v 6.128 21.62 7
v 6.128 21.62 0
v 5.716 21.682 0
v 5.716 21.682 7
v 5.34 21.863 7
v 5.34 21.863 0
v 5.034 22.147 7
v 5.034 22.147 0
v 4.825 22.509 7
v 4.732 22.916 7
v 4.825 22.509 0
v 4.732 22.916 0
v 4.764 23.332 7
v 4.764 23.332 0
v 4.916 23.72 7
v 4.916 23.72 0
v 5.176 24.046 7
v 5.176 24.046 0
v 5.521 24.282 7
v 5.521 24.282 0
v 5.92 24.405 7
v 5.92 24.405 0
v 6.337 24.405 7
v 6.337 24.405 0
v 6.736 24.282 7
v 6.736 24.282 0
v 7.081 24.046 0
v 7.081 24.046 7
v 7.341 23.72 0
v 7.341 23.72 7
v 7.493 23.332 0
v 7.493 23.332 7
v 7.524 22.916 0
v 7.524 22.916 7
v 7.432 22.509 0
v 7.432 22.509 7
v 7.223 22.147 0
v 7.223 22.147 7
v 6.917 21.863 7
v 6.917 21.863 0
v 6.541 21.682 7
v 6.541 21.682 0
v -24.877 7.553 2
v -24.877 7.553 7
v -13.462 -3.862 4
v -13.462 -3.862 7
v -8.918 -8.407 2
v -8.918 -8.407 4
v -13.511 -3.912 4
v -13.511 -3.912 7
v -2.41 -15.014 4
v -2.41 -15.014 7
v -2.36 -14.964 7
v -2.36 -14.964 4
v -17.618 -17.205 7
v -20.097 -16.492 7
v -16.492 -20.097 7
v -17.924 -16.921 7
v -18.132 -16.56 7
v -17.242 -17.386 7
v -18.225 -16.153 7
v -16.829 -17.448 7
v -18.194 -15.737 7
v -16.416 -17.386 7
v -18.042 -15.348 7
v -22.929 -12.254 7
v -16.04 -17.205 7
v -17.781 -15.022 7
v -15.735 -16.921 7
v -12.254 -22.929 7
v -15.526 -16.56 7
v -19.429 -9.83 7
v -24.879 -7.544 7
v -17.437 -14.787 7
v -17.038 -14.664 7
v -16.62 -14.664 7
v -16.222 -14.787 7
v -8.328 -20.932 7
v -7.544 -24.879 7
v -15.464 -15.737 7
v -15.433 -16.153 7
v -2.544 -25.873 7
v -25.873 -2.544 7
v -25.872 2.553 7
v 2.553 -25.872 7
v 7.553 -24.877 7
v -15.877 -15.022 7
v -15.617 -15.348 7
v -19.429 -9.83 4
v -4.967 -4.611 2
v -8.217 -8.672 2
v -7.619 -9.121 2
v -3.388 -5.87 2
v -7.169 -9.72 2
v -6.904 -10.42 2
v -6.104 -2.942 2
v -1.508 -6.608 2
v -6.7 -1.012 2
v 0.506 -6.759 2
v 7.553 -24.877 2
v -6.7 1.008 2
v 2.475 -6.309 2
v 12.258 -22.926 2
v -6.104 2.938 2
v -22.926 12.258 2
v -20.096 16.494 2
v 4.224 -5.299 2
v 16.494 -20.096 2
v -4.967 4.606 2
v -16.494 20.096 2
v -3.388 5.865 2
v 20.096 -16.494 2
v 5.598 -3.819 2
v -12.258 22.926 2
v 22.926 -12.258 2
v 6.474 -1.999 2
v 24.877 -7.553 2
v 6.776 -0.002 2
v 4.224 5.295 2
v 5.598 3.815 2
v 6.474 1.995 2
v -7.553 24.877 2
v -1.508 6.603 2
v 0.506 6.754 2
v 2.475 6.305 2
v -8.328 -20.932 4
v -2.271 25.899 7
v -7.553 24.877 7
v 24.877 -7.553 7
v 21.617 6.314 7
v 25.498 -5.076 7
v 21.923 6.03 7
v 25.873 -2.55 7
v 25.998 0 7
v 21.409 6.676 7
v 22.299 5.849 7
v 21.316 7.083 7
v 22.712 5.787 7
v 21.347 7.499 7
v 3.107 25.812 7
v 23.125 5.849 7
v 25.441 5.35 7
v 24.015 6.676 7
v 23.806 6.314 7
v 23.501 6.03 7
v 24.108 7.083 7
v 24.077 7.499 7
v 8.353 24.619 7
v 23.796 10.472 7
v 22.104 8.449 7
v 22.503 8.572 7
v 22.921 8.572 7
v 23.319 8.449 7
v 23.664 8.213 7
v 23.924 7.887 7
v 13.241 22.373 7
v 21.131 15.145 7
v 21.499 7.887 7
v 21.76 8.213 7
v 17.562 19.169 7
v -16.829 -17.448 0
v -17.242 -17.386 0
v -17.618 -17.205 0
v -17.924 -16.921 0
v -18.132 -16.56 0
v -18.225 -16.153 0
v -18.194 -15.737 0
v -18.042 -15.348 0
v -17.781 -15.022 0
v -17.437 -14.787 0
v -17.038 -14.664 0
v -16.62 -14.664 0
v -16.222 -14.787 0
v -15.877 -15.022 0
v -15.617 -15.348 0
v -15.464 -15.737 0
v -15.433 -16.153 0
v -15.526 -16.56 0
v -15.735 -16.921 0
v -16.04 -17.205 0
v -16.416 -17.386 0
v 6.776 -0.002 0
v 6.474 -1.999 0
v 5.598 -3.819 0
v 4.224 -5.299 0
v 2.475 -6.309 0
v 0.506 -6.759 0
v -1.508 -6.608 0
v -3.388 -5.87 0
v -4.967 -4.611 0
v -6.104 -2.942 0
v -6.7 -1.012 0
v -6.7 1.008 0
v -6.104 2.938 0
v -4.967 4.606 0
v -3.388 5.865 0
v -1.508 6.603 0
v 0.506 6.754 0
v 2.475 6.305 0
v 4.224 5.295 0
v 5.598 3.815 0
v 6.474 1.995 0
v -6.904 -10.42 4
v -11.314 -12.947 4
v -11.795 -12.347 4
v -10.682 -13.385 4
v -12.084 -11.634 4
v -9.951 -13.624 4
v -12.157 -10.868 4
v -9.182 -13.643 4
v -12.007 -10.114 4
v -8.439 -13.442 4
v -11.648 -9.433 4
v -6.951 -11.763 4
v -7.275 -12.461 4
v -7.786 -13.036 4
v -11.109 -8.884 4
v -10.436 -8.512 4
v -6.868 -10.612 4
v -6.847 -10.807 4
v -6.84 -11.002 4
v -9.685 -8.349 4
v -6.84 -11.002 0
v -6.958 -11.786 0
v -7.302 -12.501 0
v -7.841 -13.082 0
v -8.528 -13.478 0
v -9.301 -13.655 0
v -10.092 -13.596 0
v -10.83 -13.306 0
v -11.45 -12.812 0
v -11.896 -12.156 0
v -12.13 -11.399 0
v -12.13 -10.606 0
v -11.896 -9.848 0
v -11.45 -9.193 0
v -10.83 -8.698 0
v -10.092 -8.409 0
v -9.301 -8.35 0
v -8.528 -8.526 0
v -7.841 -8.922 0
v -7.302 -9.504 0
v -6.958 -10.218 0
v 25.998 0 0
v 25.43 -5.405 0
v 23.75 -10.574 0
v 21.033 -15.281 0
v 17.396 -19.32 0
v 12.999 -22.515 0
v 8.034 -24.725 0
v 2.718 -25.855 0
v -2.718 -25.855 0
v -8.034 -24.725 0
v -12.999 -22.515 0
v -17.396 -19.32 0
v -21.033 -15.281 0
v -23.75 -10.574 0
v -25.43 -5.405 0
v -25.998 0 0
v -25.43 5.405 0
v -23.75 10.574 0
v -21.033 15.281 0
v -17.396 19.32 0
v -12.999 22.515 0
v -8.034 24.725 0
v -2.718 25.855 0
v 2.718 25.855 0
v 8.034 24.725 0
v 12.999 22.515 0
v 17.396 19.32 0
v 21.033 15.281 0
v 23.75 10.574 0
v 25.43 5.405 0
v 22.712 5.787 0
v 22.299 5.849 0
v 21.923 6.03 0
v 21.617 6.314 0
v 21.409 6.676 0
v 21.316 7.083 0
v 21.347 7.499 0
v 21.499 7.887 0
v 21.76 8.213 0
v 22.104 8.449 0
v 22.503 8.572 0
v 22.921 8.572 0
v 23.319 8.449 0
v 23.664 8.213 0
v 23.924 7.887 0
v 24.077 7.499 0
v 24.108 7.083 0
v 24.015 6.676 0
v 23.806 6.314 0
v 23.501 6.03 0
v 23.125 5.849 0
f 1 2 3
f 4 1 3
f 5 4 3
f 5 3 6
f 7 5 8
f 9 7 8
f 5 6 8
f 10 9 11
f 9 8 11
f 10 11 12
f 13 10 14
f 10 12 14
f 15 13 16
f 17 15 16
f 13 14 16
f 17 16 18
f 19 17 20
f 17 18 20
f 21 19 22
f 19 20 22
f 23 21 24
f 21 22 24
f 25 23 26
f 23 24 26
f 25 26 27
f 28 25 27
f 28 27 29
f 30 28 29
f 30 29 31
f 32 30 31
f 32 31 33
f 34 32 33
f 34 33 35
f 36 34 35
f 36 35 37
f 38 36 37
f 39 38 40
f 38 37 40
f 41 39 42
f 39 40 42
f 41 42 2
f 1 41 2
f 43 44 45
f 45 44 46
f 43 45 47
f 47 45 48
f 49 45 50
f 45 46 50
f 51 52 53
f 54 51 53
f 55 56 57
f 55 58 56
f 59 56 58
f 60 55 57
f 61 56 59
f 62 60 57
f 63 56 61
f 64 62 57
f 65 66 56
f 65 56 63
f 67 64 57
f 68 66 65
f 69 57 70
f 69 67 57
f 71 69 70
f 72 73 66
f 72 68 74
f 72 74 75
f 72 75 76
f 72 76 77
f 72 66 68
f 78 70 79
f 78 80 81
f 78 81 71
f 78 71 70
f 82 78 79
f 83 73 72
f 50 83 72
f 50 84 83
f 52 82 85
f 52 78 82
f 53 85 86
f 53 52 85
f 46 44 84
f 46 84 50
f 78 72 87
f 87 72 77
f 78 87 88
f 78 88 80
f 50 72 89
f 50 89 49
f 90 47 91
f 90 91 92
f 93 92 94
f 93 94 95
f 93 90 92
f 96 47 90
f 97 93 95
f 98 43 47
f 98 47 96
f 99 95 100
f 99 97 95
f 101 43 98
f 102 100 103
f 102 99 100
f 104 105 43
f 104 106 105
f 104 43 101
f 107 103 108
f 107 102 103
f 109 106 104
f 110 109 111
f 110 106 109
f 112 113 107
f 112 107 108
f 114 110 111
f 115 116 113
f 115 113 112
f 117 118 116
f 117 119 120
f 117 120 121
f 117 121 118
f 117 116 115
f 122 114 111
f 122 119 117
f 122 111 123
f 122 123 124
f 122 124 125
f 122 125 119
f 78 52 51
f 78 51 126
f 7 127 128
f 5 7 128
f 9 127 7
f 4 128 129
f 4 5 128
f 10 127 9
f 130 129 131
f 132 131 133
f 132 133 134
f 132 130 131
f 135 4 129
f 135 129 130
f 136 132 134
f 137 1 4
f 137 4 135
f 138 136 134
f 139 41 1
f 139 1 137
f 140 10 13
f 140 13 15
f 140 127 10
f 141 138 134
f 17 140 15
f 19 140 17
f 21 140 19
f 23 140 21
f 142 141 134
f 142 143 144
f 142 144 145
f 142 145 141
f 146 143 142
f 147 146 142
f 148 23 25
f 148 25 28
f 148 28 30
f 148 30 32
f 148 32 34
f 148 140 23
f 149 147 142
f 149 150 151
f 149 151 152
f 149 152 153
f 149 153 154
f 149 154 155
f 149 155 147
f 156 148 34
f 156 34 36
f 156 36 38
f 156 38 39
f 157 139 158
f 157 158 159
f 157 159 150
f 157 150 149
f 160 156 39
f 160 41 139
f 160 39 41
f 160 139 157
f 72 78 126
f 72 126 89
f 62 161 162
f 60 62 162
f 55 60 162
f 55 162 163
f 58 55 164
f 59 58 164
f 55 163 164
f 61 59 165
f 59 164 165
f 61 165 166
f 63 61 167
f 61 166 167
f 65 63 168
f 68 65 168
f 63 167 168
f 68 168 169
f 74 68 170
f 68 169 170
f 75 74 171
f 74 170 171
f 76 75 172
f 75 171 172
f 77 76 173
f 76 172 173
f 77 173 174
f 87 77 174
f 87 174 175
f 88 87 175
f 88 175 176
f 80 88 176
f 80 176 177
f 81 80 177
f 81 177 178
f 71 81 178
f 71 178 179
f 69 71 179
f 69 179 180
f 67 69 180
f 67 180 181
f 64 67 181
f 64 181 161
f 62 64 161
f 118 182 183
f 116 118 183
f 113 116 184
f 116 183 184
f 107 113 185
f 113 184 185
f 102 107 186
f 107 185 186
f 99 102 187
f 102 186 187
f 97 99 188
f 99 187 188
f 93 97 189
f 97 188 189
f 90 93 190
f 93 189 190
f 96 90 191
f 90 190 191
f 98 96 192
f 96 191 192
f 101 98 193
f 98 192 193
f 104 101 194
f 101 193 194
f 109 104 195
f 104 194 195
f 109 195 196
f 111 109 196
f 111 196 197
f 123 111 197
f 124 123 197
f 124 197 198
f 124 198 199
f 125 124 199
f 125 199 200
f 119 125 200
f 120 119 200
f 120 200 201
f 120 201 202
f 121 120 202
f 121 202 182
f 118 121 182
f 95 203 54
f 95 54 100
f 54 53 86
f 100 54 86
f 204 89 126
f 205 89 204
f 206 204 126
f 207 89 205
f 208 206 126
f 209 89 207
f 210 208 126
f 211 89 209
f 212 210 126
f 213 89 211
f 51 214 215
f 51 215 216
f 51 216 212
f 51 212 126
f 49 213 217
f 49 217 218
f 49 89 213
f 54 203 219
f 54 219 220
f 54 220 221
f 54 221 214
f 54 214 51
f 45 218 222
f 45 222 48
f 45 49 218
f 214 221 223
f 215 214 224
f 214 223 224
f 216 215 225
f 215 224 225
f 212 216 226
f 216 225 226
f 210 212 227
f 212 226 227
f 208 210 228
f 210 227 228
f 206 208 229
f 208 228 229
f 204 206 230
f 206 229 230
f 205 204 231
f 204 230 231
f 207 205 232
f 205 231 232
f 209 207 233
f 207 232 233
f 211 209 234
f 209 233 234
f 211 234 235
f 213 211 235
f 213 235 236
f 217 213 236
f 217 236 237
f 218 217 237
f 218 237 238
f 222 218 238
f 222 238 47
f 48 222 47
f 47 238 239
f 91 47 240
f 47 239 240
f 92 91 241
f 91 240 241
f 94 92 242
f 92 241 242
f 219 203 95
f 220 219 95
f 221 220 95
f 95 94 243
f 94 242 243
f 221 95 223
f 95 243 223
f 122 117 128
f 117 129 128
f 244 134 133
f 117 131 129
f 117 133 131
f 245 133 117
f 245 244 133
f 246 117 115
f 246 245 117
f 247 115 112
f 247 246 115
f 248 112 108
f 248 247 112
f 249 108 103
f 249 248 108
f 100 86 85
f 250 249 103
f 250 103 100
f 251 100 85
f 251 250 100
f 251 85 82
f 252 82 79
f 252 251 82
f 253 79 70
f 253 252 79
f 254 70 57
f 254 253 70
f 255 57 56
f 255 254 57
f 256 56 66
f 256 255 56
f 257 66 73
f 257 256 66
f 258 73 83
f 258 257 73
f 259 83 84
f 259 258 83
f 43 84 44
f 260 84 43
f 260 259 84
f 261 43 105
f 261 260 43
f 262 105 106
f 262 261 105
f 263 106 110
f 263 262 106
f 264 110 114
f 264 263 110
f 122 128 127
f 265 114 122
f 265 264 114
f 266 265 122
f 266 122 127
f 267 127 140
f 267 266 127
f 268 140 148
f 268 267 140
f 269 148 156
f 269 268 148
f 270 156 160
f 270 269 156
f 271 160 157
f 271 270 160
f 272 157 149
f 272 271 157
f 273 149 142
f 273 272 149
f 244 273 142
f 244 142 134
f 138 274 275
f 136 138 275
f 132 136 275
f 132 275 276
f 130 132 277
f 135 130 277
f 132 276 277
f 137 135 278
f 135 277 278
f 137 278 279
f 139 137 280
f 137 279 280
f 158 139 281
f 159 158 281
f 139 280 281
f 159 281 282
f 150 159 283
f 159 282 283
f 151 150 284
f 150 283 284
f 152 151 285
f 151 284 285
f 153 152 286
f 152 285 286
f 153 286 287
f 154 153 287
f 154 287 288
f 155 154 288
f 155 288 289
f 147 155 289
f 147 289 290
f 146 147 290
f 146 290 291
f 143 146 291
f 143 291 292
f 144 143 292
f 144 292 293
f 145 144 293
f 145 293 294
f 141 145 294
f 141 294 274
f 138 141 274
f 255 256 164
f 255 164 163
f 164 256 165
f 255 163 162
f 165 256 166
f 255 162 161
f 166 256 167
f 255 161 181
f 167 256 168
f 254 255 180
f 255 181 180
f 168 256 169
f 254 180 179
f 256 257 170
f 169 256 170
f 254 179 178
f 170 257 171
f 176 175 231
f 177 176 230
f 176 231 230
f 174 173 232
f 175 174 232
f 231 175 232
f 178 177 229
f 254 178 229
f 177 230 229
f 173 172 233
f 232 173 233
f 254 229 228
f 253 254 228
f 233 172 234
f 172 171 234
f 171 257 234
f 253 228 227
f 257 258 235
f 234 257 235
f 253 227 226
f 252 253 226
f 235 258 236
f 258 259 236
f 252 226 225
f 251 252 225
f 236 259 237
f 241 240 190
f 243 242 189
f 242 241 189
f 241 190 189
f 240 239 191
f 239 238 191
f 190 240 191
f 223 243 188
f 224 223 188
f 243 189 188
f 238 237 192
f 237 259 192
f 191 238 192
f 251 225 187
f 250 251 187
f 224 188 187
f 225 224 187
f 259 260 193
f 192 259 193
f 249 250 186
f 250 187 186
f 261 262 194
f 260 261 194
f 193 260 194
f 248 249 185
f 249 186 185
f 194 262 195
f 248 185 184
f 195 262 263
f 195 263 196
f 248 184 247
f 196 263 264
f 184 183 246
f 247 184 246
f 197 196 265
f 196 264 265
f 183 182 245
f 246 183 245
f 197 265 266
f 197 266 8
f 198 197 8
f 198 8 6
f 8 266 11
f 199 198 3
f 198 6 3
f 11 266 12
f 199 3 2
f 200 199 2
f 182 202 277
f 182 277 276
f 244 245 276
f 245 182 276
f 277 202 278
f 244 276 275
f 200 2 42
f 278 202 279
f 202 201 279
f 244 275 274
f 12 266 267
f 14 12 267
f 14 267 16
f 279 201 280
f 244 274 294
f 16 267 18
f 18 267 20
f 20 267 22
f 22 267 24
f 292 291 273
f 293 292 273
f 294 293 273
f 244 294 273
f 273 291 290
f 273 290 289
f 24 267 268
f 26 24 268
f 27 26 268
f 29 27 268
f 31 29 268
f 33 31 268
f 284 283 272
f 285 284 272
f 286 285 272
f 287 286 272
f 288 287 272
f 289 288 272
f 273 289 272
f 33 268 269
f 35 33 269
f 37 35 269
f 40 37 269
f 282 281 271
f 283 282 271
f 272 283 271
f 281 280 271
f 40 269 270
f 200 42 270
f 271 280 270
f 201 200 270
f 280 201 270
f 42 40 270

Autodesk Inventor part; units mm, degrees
ref_plane "YZ Plane" through (0, 0, 0) normal (1, 0, 0) x (0, 1, 0)
ref_plane "XZ Plane" through (0, 0, 0) normal (0, 1, 0) x (-1, 0, 0)
ref_plane "XY Plane" through (0, 0, 0) normal (0, 0, 1) x (1, 0, 0)
ref_plane "Work Plane1" through (0, 0, 0) normal (0, 0, 1) x (1, 0, 0)
sketch "Sketch1" plane through (0, 0, 0) normal (0, 0, 1) x (1, 0, 0)
  circle A0 centre (0, 0) radius 25.9979 projected
  circle A1 centre (-9.4998, -11.0022) radius 2.6601 projected
  circle A2 centre (0.0001, -0.0022) radius 3.8801 projected
  circle A3 centre (0.0001, -0.0022) radius 6.7754 projected
  point P0 (0, 0)
extrude "Extrusion1" add sketch "Sketch1" along normal blind 7 contours A0
sketch "Sketch2" plane through (0, 0, 7) normal (0, 0, 1) x (1, 0, 0)
  line L0 (32.4435, -15.1193) -> (-15.1193, 32.4435)
  line L1 (-15.1193, 32.4435) -> (-32.4435, 15.1193)
  line L2 (-32.4435, 15.1193) -> (15.1193, -32.4435)
  line L3 (15.1193, -32.4435) -> (32.4435, -15.1193)
  line L4 (32.4435, -15.1193) -> (-32.4435, 15.1193) construction
  line L5 (-15.1193, 32.4435) -> (15.1193, -32.4435) construction
  line L6 (32.4435, -15.1193) -> (99.7074, -15.1193) construction
  point P0 (0, 0)
  dimension "d2" = 135
  dimension "d3" = 24.5
extrude "Extrusion2" cut sketch "Sketch2" against normal blind 5
sketch "Sketch3" plane through (0, 0, 7) normal (0, 0, 1) x (1, 0, 0)
  line L0 (-8.3276, -20.7901) -> (-2.5509, -15.0135) projected
  line L1 (-2.5509, -15.0135) -> (-13.5111, -4.0533) projected
  line L2 (-19.2877, -9.8299) -> (-13.5111, -4.0533) projected
  line L3 (-8.3276, -20.7901) -> (-19.2877, -9.8299) projected
  line L4 (-13.5111, -3.9119) -> (-2.4095, -15.0135)
  line L5 (-2.4095, -15.0135) -> (-8.3276, -20.9315)
  line L6 (-8.3276, -20.9315) -> (-19.4292, -9.8299)
  line L7 (-19.4292, -9.8299) -> (-13.5111, -3.9119)
  line L8 (-8.9176, -8.4066) -> (-24.8767, 7.5526) projected
  line L9 (-13.4617, -3.8624) -> (-2.4095, -15.0135)
  line L10 (-2.4095, -15.0135) -> (-0.3384, -12.9607)
  line L11 (-0.3384, -12.9607) -> (-11.3905, -1.8096)
  line L12 (-11.3905, -1.8096) -> (-13.4617, -3.8624)
  line L13 (-13.4617, -3.8624) -> (-13.5111, -3.9119)
  line L14 (-8.9176, -8.4066) -> (-24.8767, 7.5526) projected
  point P0 (0, 0)
  dimension "d6" = 0.1
extrude "Extrusion3" cut sketch "Sketch3" against normal blind 3 contours L3 L2 L1 L0 | L13 L9 L4 | L4 L5 L6 L7 | L9 L12 L11 L10
sketch "Skizze4" plane through (0, 0, 7) normal (0, 0, 1) x (1, 0, 0)
  spline S0 degree 2 poles (24.1427, 2.2394) (24.731, 1.8489) (25.3785, 0.5587) (25.3785, -0.3311) knots 0 0 0 1 2 2 2 construction
  spline S1 degree 2 poles (25.3785, -0.3311) (25.3785, -1.1665) (24.7013, -2.5111) (24.1328, -2.8867) knots 0 0 0 1 2 2 2 construction
  spline S2 degree 2 poles (24.1328, -2.8867) (23.6682, -3.1784) (22.7141, -3.3761) (21.9726, -3.3761) knots 0 0 0 1 2 2 2 construction
  line L0 (21.9726, -3.3761) -> (20.5687, -3.3761) construction
  line L1 (20.5687, -3.3761) -> (20.5687, 2.7239) construction
  line L2 (20.5687, 2.7239) -> (21.9578, 2.7239) construction
  spline S3 degree 2 poles (21.9578, 2.7239) (22.8179, 2.7239) (23.7967, 2.4668) (24.1427, 2.2394) knots 0 0 0 1 2 2 2 construction
  spline S4 degree 2 poles (19.1896, -2.9312) (18.8979, -3.1982) (18.1564, -3.4849) (17.5978, -3.4849) knots 0 0 0 1 2 2 2 construction
  spline S5 degree 2 poles (17.5978, -3.4849) (16.9354, -3.4849) (16.0061, -3.2081) (15.5958, -3.0103) knots 0 0 0 1 2 2 2 construction
  line L3 (15.5958, -3.0103) -> (15.5958, -1.992) construction
  line L4 (15.5958, -1.992) -> (15.6551, -1.992) construction
  spline S6 degree 2 poles (15.6551, -1.992) (16.0555, -2.3677) (17.0689, -2.7829) (17.5385, -2.7829) knots 0 0 0 1 2 2 2 construction
  spline S7 degree 2 poles (17.5385, -2.7829) (18.2108, -2.7829) (18.8979, -2.2243) (18.8979, -1.7646) knots 0 0 0 1 2 2 2 construction
  spline S8 degree 2 poles (18.8979, -1.7646) (18.8979, -1.3988) (18.5371, -0.944) (18.1465, -0.8303) knots 0 0 0 1 2 2 2 construction
  spline S9 degree 2 poles (18.1465, -0.8303) (17.8648, -0.7513) (17.3952, -0.6425) (17.0442, -0.5535) knots 0 0 0 1 2 2 2 construction
  spline S10 degree 2 poles (17.0442, -0.5535) (16.7278, -0.4695) (16.2285, -0.2174) (16.0358, -0.0147) knots 0 0 0 1 2 2 2 construction
  spline S11 degree 2 poles (16.0358, -0.0147) (15.8479, 0.188) (15.6403, 0.7317) (15.6403, 1.0876) knots 0 0 0 1 2 2 2 construction
  spline S12 degree 2 poles (15.6403, 1.0876) (15.6403, 1.8291) (16.797, 2.8326) (17.6918, 2.8326) knots 0 0 0 1 2 2 2 construction
  spline S13 degree 2 poles (17.6918, 2.8326) (18.2059, 2.8326) (19.1154, 2.6299) (19.5059, 2.4372) knots 0 0 0 1 2 2 2 construction
  line L5 (19.5059, 2.4372) -> (19.5059, 1.4683) construction
  line L6 (19.5059, 1.4683) -> (19.4466, 1.4683) construction
  spline S14 degree 2 poles (19.4466, 1.4683) (19.155, 1.7352) (18.2454, 2.1307) (17.7461, 2.1307) knots 0 0 0 1 2 2 2 construction
  spline S15 degree 2 poles (17.7461, 2.1307) (17.1826, 2.1307) (16.4856, 1.6017) (16.4856, 1.1717) knots 0 0 0 1 2 2 2 construction
  spline S16 degree 2 poles (16.4856, 1.1717) (16.4856, 0.7861) (16.8959, 0.3264) (17.2815, 0.2226) knots 0 0 0 1 2 2 2 construction
  spline S17 degree 2 poles (17.2815, 0.2226) (17.5385, 0.1534) (18.285, -0.0246) (18.5321, -0.0987) knots 0 0 0 1 2 2 2 construction
  spline S18 degree 2 poles (18.5321, -0.0987) (19.1599, -0.2915) (19.7432, -1.0676) (19.7432, -1.6361) knots 0 0 0 1 2 2 2 construction
  spline S19 degree 2 poles (19.7432, -1.6361) (19.7432, -1.997) (19.4516, -2.689) (19.1896, -2.9312) knots 0 0 0 1 2 2 2 construction
  circle A0 centre (-9.9998, 17.4978) radius 1.3999 construction
  circle A1 centre (10.0001, 17.4979) radius 1.4 construction
  circle A2 centre (10.0001, -17.5021) radius 1.4 construction
  circle A3 centre (-9.9998, -17.5021) radius 1.4001 construction
  arc A4 (-25.1198, 6.6998) -> (-24.1417, 5.4917) centre (-24.1417, 6.4917) ccw construction
  line L7 (-24.1417, 5.4917) -> (-17.7002, 5.4917) construction
  arc A5 (-15.7002, 3.4917) -> (-17.7002, 5.4917) centre (-17.7002, 3.4917) ccw construction
  line L8 (-15.7002, 3.4917) -> (-15.7002, -4.496) construction
  arc A6 (-17.7002, -6.496) -> (-15.7002, -4.496) centre (-17.7002, -4.496) ccw construction
  line L9 (-17.7002, -6.496) -> (-23.8502, -6.496) construction
  arc A7 (-23.8502, -6.496) -> (-24.8235, -7.7254) centre (-23.8502, -7.496) ccw construction
  arc A8 (-24.8235, -7.7254) -> (-25.1198, 6.6998) centre (0, 0) ccw construction
  circle A9 centre (-9.4998, -11.0022) radius 2.6601 construction
  circle A10 centre (-16.8291, -16.0482) radius 1.4 construction
  circle A11 centre (6.1284, 23.0202) radius 1.4 construction
  circle A12 centre (22.7119, 7.1872) radius 1.4 construction
  circle A13 centre (0.0001, -0.0022) radius 6.5 construction
  point P0 (0, 0)
hole "Bohrung1" at (6.1284, 23.0202, 7) at (22.7119, 7.1872, 7) at (-16.8291, -16.0482, 7) direction (0, 0, -1) diameter 2.8 end through all
properties part number "Matchboxscope_sample_v1"
